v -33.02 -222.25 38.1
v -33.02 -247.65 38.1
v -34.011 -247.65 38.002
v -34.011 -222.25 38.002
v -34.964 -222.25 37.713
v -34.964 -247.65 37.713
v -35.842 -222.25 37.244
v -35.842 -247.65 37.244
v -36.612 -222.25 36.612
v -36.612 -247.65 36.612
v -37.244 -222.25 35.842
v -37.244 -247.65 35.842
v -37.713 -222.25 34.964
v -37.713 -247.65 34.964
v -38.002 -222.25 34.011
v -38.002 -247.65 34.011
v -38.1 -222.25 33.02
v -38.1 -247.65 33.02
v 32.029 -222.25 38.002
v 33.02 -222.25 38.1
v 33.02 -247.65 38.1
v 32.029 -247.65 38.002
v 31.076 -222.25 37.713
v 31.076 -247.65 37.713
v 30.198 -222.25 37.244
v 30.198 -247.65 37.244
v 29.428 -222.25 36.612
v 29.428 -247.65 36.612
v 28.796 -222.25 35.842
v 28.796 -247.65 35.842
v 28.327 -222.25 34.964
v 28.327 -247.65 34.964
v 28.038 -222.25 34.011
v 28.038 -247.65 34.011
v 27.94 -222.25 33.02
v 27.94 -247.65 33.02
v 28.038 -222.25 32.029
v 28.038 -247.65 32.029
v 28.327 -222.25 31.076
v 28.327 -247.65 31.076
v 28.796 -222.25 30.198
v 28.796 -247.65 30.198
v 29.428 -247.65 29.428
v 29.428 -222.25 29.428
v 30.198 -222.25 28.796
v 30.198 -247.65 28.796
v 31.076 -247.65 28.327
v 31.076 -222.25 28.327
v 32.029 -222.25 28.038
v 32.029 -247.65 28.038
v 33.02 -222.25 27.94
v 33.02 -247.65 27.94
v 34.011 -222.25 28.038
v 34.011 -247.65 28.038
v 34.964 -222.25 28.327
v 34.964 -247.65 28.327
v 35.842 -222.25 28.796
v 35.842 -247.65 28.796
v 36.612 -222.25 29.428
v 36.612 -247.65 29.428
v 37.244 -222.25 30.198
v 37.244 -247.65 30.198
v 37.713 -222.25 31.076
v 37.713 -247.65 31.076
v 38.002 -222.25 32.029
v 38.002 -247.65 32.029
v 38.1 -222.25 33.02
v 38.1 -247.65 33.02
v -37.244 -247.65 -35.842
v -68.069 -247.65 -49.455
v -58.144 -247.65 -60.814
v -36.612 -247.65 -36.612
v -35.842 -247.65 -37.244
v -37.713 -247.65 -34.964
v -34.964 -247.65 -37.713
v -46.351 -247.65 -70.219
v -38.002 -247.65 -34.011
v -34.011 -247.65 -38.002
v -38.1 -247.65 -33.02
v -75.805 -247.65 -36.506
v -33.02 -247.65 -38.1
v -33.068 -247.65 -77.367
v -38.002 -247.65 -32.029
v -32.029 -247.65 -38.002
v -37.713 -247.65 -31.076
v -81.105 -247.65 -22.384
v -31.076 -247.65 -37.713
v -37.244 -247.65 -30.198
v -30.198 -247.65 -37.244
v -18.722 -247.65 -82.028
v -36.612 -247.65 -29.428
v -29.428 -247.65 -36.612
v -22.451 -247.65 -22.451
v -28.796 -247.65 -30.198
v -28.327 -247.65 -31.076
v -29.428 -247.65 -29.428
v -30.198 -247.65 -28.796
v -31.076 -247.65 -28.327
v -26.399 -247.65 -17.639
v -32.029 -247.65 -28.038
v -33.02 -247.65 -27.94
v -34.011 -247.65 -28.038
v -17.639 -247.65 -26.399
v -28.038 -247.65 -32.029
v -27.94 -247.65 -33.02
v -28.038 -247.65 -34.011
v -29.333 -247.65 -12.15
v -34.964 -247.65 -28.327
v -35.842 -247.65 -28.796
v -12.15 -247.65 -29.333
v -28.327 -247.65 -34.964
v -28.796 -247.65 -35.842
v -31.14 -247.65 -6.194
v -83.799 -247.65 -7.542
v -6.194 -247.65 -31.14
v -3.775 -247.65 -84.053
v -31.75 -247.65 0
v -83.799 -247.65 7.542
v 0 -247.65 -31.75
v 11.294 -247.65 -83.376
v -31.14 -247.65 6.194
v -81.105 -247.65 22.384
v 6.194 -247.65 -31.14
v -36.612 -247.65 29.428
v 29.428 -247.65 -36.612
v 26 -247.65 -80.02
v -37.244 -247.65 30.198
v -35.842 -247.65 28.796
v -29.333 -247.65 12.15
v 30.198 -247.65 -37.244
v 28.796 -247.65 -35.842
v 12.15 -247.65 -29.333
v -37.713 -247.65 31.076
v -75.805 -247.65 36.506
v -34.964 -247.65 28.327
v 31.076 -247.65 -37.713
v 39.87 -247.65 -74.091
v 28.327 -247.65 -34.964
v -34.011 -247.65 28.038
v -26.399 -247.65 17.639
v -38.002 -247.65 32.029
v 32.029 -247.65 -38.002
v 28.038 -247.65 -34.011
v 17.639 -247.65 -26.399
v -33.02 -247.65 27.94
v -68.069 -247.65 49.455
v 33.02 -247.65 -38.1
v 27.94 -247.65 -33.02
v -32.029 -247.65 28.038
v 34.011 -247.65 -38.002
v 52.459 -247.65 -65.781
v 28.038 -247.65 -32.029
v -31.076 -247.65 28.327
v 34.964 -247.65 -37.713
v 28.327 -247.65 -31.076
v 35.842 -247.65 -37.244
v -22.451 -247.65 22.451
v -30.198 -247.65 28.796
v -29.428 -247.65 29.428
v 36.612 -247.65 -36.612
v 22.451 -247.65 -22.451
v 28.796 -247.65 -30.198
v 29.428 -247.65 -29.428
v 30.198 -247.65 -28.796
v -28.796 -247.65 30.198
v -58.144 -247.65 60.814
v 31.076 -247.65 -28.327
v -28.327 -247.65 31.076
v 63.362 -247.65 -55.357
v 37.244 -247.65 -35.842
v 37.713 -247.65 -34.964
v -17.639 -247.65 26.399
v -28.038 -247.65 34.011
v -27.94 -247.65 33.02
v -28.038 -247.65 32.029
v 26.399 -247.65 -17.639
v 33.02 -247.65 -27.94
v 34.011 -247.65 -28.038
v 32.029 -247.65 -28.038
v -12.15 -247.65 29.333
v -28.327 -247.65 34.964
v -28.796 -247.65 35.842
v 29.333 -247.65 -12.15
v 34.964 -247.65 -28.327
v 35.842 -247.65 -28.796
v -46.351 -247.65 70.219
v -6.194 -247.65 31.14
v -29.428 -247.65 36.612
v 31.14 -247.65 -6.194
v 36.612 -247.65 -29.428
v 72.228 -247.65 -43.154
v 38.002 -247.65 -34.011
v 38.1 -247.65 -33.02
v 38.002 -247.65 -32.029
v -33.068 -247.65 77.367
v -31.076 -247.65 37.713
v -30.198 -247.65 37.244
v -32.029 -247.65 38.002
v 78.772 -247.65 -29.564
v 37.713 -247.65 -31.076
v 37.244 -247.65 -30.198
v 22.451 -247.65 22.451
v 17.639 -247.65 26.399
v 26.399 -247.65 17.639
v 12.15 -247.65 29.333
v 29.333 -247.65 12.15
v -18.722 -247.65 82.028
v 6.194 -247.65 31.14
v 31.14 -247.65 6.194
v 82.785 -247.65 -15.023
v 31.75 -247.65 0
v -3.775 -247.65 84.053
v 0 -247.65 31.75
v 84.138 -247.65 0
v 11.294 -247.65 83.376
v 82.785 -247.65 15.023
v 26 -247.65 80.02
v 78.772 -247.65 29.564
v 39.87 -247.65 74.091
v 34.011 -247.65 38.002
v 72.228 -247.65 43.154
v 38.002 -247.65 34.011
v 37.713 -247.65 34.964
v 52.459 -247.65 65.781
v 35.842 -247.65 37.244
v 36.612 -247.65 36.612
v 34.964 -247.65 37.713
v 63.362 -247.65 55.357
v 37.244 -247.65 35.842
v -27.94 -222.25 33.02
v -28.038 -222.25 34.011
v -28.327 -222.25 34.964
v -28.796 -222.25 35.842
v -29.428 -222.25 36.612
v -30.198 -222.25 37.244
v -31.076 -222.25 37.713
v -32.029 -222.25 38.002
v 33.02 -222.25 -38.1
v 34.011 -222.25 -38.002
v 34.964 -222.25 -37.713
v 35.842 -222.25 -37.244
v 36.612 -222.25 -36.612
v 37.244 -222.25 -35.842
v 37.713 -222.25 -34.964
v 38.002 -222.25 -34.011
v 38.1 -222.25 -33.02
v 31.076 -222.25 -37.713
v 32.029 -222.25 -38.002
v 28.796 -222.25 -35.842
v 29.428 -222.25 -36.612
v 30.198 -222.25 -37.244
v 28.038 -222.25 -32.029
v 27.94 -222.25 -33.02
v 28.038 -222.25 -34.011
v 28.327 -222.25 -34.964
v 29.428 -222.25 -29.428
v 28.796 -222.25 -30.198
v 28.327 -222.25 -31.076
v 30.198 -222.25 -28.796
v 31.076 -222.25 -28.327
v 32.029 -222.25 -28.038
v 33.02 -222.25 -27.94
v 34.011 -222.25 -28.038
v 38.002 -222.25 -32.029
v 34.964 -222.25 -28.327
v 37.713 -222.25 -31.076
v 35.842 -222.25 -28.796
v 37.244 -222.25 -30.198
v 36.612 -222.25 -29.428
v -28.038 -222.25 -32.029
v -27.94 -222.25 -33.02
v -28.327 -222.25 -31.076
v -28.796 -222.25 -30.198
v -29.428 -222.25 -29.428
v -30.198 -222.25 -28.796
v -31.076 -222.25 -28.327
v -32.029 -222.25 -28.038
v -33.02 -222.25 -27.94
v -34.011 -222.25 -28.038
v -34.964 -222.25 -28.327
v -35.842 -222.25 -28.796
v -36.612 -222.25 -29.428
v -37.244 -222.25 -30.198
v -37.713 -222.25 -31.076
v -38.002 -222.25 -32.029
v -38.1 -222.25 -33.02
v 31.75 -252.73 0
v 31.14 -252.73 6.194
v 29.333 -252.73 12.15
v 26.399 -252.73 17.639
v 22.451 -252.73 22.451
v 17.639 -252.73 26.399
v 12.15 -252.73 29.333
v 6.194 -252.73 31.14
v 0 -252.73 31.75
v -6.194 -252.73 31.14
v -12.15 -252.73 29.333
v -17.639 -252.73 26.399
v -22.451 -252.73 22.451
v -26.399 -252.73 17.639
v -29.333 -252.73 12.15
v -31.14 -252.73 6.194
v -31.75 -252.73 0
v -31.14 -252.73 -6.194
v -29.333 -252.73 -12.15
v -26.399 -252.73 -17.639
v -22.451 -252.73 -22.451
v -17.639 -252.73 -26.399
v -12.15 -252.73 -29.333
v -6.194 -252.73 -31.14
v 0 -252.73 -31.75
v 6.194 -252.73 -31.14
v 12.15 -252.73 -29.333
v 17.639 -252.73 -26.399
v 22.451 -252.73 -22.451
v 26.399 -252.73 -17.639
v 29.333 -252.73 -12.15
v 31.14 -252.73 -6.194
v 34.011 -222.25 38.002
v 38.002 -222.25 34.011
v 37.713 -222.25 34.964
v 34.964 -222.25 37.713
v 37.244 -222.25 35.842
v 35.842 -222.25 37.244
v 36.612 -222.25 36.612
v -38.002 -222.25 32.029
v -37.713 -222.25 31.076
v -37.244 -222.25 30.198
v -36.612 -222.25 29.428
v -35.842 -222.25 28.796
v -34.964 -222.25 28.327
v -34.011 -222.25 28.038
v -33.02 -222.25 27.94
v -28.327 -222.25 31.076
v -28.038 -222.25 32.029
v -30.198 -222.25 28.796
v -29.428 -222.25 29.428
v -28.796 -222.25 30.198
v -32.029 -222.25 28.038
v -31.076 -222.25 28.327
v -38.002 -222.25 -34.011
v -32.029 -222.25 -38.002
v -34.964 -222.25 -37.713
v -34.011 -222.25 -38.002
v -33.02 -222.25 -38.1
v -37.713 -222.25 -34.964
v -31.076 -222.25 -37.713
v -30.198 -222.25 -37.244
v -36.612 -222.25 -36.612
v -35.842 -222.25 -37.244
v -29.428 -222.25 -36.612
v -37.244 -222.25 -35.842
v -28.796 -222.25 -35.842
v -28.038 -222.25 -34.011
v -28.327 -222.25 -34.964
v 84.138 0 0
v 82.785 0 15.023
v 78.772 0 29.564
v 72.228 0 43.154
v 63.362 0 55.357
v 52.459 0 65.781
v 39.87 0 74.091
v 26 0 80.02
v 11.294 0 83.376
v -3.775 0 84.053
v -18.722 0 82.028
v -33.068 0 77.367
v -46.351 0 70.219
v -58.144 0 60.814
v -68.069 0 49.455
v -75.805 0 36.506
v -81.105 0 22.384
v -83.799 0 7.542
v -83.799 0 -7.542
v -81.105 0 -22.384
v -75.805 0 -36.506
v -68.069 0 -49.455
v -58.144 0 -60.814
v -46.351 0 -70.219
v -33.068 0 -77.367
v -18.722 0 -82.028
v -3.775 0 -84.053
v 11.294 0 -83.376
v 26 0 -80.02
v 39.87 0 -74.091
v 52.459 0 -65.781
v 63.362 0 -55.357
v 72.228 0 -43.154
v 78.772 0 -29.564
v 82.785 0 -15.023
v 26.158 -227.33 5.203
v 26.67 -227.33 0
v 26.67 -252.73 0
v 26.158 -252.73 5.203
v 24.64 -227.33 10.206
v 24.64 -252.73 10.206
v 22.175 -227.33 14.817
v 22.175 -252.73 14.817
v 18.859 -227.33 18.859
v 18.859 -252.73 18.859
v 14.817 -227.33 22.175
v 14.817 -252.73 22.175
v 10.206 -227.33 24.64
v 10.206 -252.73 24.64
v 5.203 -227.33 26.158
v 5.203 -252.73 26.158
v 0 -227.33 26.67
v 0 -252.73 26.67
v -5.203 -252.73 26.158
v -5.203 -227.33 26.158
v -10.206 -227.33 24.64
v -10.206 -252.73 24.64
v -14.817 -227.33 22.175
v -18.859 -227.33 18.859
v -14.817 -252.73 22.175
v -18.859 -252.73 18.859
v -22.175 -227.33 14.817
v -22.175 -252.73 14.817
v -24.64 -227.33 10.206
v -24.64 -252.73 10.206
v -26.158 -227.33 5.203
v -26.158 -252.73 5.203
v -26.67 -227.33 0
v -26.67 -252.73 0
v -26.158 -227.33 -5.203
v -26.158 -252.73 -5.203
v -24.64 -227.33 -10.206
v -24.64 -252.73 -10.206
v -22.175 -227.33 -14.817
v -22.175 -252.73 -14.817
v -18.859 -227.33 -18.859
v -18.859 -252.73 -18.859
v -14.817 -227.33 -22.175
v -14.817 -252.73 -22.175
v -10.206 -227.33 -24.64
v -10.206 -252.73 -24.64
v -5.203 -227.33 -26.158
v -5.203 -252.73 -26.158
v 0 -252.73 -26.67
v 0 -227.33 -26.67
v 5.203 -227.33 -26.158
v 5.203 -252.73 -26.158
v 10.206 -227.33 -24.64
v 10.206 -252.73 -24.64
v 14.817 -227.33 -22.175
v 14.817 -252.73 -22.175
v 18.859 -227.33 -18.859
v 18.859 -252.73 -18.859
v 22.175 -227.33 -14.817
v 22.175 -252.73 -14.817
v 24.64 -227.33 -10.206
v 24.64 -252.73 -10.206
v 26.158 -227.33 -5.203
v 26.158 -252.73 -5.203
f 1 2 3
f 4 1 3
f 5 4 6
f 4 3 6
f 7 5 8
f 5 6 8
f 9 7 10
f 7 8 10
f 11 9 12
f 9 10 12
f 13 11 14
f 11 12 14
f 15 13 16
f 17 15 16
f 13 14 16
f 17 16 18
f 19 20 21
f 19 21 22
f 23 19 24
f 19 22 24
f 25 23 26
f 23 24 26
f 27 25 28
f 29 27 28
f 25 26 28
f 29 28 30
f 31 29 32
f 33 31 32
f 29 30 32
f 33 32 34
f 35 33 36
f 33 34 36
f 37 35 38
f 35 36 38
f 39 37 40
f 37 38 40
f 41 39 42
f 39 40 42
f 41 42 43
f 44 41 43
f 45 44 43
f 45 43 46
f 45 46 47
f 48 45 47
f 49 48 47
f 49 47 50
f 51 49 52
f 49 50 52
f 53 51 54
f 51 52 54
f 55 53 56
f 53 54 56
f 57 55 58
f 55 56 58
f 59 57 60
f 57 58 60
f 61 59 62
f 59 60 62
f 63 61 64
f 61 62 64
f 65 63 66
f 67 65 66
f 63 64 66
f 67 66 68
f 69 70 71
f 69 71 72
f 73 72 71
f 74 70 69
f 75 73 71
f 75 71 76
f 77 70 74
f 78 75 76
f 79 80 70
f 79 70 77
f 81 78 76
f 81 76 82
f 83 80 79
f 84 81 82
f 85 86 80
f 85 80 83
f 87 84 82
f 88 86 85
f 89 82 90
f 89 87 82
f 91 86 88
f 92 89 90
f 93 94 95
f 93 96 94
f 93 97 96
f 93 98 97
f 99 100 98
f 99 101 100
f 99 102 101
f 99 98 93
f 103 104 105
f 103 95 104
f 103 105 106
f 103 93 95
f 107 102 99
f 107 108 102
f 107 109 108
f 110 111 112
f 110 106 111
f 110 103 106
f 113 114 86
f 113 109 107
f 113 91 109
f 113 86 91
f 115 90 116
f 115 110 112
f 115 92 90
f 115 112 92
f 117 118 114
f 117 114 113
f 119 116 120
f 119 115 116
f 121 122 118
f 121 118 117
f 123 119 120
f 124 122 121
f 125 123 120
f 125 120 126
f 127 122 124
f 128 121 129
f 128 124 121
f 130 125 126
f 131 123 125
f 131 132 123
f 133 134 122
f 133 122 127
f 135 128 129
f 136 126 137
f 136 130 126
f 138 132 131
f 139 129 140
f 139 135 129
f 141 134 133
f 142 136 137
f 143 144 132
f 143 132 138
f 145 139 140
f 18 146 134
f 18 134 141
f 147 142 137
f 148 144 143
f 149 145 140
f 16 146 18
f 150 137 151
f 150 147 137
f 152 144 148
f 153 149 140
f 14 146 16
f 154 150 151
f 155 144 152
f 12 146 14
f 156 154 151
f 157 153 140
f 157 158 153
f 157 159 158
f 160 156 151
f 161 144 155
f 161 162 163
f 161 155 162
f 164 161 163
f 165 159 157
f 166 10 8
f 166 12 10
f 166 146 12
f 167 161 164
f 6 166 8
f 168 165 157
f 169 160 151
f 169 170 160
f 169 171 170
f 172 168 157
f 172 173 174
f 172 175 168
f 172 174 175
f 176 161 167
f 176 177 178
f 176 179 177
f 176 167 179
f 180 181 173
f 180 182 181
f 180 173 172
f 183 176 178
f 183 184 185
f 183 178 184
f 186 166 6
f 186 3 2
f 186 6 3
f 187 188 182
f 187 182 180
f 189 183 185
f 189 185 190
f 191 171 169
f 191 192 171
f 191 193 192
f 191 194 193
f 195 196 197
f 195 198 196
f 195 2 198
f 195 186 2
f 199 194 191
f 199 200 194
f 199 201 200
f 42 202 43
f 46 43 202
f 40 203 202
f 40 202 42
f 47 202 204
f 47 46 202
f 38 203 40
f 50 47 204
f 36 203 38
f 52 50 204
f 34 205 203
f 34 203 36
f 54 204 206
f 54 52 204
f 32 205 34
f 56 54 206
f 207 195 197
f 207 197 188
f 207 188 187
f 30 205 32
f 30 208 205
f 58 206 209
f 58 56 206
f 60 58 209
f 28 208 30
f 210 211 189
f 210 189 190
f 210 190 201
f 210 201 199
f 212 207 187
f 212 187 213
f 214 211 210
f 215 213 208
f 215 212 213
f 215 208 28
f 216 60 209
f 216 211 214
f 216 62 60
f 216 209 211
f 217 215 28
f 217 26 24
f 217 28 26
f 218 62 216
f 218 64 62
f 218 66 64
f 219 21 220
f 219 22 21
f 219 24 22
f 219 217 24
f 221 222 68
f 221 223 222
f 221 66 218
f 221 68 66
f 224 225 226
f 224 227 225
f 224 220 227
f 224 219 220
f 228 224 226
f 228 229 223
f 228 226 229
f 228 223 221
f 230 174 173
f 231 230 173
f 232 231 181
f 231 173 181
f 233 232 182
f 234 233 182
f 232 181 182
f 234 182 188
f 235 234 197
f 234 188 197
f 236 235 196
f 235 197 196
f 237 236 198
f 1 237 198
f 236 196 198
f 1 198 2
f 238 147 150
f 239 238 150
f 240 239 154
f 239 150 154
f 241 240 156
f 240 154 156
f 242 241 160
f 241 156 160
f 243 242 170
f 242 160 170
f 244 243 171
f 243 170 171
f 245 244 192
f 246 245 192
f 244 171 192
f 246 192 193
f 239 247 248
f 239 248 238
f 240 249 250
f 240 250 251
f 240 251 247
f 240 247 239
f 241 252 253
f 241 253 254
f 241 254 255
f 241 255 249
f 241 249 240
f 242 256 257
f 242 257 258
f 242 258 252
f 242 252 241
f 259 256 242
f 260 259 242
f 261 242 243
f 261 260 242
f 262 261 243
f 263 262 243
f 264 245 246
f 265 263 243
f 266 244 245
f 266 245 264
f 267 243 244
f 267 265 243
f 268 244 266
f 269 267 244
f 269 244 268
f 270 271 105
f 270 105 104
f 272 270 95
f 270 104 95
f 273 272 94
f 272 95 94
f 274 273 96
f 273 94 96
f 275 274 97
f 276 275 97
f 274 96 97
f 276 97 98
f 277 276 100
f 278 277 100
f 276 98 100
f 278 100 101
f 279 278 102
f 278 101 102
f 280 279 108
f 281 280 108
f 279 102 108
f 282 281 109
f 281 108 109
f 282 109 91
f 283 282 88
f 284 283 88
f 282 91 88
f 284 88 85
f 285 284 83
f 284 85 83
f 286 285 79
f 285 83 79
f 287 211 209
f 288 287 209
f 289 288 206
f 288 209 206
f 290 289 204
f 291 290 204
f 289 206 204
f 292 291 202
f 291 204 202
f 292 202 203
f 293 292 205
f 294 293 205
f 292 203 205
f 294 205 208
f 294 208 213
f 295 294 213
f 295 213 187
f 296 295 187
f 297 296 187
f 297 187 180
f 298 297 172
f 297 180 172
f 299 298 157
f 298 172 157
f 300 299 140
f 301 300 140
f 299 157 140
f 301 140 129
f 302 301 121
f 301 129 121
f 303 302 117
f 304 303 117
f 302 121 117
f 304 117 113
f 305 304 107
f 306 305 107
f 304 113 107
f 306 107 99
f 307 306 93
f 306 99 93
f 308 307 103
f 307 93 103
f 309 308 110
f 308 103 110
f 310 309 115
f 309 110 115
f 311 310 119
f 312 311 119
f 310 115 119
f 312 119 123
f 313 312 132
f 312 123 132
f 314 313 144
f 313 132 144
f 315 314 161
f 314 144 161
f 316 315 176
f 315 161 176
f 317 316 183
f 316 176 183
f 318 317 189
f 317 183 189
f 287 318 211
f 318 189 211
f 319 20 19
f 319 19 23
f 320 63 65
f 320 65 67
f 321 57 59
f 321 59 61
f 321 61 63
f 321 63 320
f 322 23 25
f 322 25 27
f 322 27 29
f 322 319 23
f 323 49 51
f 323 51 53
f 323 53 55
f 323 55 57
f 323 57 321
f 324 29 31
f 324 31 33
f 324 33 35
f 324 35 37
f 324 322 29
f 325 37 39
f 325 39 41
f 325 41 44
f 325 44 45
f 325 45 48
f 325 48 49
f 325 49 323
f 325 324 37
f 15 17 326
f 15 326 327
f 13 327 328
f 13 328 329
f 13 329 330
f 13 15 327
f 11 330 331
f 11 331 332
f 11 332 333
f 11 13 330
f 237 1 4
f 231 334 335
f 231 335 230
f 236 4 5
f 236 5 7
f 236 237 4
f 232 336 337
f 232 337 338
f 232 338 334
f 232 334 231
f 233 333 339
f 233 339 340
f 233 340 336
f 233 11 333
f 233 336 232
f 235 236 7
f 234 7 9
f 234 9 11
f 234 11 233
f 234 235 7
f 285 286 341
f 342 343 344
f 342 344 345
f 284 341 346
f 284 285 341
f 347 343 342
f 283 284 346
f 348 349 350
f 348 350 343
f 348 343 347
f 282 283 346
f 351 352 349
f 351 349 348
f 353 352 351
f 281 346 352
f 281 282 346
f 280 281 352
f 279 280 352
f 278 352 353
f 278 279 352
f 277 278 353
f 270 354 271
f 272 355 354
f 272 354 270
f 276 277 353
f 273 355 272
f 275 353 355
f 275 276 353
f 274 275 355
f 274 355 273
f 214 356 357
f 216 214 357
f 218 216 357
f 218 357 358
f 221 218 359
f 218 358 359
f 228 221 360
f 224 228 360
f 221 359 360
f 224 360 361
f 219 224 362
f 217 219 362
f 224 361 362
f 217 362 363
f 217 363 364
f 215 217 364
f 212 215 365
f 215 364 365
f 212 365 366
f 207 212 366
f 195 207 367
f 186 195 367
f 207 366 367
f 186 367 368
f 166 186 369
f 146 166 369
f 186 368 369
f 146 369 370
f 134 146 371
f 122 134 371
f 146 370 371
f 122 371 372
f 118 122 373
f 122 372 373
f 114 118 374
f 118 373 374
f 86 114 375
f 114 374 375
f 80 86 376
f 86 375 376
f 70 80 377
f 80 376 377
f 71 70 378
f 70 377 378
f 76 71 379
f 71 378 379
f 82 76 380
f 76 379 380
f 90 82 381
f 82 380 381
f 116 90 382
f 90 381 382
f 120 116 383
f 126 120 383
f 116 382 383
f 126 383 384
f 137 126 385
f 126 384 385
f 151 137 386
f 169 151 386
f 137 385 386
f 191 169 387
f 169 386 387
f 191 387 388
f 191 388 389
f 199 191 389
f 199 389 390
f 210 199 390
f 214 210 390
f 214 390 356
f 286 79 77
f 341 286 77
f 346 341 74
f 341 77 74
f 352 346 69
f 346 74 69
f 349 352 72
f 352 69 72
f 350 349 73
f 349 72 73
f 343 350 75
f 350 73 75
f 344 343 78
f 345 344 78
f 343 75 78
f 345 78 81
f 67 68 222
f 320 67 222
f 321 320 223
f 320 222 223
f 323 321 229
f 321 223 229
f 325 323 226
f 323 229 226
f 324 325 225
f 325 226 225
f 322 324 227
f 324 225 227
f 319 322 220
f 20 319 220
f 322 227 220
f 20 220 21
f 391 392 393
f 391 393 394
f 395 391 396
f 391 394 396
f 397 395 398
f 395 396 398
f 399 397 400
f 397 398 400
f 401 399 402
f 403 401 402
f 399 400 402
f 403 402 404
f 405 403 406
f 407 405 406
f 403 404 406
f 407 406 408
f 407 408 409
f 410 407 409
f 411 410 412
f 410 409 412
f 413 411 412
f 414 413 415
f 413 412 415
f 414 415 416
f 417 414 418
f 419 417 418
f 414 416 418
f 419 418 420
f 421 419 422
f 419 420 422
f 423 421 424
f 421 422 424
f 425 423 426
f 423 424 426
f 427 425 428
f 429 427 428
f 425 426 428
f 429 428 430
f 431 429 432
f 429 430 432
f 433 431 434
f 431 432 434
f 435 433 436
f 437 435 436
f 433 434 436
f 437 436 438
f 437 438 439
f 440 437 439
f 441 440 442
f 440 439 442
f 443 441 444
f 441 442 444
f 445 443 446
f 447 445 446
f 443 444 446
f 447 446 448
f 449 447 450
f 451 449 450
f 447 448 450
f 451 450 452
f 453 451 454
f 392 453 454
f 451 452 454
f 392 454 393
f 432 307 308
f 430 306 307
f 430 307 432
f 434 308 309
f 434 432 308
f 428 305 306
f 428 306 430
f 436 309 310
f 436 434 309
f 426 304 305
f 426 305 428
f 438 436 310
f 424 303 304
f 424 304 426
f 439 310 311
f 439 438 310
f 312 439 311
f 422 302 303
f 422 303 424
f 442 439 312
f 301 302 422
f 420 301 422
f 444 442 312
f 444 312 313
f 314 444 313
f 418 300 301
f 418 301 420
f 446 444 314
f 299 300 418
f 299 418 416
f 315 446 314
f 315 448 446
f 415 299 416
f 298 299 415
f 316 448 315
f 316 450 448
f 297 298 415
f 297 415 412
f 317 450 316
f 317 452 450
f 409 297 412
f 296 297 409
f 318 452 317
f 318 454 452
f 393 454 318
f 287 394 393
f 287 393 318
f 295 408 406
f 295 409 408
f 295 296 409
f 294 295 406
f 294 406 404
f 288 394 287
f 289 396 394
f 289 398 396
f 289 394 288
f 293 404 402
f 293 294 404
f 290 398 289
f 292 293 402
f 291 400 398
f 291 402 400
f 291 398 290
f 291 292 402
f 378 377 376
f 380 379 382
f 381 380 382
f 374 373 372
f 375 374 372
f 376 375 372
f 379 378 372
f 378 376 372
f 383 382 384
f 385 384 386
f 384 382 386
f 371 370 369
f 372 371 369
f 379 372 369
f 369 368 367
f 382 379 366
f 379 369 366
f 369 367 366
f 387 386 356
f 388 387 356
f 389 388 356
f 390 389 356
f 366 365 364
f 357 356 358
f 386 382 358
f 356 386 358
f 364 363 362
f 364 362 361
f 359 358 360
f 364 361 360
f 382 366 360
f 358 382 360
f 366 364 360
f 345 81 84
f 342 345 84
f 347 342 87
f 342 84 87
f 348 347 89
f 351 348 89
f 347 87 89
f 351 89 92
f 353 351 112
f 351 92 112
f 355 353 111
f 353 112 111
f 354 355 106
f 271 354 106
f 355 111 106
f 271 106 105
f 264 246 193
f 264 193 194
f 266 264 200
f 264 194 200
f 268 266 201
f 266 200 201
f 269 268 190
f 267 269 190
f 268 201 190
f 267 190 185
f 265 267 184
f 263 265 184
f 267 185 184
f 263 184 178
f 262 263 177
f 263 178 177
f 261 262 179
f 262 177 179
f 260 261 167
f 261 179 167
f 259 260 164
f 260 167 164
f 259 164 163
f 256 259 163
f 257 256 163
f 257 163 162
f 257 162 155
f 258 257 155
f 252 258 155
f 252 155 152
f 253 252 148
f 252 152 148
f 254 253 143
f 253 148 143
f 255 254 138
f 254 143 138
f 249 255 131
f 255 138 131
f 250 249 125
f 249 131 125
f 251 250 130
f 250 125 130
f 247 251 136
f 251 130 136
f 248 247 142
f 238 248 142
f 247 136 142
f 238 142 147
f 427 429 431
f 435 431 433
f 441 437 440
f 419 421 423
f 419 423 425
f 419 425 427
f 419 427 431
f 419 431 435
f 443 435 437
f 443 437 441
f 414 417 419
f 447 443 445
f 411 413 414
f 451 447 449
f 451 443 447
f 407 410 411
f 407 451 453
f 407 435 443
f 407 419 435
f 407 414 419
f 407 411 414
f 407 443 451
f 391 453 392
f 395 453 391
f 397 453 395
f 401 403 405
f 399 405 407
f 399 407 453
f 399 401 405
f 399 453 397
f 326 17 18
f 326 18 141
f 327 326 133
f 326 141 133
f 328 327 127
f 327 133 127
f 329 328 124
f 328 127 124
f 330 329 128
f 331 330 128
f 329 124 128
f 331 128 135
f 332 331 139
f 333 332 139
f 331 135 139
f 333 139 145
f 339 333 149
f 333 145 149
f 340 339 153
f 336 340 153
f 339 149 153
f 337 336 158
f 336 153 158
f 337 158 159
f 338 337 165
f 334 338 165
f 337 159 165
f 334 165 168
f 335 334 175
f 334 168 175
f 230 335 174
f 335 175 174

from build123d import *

# Parameters (mm, degrees)
F0_R     = 84.1375
F1_DEPTH = 247.65
F2_R     = 31.75
F3_DEPTH = 5.08
F5_DEPTH = 25.4
F6_R     = 26.67
F7_DEPTH = 25.4


# Not quite as in the source:
# - a feature names something its author has since deleted; it is built from what else it names


with BuildPart() as f1:
    # F0 (on Front) → F1 (new body)
    with BuildSketch(Plane.XZ):
        Circle(F0_R)
    extrude(amount=F1_DEPTH)

    # F2 (on face) → F3 (join)
    with BuildSketch(Plane.XZ.offset(247.65)):
        Circle(F2_R)
    extrude(amount=F3_DEPTH)

    # F4 (on face) → F5 (cut)
    with BuildSketch(Plane.XZ.offset(247.65)):
        with BuildLine():
            ThreePointArc((-27.94, 33.02), (-29.4278975516, 36.6121024484), (-33.02, 38.1))
            ThreePointArc((-33.02, 38.1), (-36.6121024484, 36.6121024484), (-38.1, 33.02))
            ThreePointArc((-38.1, 33.02), (-33.02, 27.94), (-27.94, 33.02))
        make_face()
        with BuildLine():
            ThreePointArc((38.1, 33.02), (36.6121024484, 36.6121024484), (33.02, 38.1))
            ThreePointArc((33.02, 38.1), (29.4278975516, 29.4278975516), (38.1, 33.02))
        make_face()
        with BuildLine():
            ThreePointArc((33.02, -38.1), (36.6121024484, -36.6121024484), (38.1, -33.02))
            ThreePointArc((38.1, -33.02), (29.4278975516, -29.4278975516), (33.02, -38.1))
        make_face()
        with BuildLine():
            ThreePointArc((-27.94, -33.02), (-33.02, -27.94), (-38.1, -33.02))
            ThreePointArc((-38.1, -33.02), (-36.6121024484, -36.6121024484), (-33.02, -38.1))
            ThreePointArc((-33.02, -38.1), (-29.4278975516, -36.6121024484), (-27.94, -33.02))
        make_face()
    extrude(amount=-F5_DEPTH, mode=Mode.SUBTRACT)

    # F6 (on face) → F7 (cut)
    with BuildSketch(Plane.XZ.offset(252.73)):
        Circle(F6_R)
    extrude(amount=-F7_DEPTH, mode=Mode.SUBTRACT)


solid = f1.part
